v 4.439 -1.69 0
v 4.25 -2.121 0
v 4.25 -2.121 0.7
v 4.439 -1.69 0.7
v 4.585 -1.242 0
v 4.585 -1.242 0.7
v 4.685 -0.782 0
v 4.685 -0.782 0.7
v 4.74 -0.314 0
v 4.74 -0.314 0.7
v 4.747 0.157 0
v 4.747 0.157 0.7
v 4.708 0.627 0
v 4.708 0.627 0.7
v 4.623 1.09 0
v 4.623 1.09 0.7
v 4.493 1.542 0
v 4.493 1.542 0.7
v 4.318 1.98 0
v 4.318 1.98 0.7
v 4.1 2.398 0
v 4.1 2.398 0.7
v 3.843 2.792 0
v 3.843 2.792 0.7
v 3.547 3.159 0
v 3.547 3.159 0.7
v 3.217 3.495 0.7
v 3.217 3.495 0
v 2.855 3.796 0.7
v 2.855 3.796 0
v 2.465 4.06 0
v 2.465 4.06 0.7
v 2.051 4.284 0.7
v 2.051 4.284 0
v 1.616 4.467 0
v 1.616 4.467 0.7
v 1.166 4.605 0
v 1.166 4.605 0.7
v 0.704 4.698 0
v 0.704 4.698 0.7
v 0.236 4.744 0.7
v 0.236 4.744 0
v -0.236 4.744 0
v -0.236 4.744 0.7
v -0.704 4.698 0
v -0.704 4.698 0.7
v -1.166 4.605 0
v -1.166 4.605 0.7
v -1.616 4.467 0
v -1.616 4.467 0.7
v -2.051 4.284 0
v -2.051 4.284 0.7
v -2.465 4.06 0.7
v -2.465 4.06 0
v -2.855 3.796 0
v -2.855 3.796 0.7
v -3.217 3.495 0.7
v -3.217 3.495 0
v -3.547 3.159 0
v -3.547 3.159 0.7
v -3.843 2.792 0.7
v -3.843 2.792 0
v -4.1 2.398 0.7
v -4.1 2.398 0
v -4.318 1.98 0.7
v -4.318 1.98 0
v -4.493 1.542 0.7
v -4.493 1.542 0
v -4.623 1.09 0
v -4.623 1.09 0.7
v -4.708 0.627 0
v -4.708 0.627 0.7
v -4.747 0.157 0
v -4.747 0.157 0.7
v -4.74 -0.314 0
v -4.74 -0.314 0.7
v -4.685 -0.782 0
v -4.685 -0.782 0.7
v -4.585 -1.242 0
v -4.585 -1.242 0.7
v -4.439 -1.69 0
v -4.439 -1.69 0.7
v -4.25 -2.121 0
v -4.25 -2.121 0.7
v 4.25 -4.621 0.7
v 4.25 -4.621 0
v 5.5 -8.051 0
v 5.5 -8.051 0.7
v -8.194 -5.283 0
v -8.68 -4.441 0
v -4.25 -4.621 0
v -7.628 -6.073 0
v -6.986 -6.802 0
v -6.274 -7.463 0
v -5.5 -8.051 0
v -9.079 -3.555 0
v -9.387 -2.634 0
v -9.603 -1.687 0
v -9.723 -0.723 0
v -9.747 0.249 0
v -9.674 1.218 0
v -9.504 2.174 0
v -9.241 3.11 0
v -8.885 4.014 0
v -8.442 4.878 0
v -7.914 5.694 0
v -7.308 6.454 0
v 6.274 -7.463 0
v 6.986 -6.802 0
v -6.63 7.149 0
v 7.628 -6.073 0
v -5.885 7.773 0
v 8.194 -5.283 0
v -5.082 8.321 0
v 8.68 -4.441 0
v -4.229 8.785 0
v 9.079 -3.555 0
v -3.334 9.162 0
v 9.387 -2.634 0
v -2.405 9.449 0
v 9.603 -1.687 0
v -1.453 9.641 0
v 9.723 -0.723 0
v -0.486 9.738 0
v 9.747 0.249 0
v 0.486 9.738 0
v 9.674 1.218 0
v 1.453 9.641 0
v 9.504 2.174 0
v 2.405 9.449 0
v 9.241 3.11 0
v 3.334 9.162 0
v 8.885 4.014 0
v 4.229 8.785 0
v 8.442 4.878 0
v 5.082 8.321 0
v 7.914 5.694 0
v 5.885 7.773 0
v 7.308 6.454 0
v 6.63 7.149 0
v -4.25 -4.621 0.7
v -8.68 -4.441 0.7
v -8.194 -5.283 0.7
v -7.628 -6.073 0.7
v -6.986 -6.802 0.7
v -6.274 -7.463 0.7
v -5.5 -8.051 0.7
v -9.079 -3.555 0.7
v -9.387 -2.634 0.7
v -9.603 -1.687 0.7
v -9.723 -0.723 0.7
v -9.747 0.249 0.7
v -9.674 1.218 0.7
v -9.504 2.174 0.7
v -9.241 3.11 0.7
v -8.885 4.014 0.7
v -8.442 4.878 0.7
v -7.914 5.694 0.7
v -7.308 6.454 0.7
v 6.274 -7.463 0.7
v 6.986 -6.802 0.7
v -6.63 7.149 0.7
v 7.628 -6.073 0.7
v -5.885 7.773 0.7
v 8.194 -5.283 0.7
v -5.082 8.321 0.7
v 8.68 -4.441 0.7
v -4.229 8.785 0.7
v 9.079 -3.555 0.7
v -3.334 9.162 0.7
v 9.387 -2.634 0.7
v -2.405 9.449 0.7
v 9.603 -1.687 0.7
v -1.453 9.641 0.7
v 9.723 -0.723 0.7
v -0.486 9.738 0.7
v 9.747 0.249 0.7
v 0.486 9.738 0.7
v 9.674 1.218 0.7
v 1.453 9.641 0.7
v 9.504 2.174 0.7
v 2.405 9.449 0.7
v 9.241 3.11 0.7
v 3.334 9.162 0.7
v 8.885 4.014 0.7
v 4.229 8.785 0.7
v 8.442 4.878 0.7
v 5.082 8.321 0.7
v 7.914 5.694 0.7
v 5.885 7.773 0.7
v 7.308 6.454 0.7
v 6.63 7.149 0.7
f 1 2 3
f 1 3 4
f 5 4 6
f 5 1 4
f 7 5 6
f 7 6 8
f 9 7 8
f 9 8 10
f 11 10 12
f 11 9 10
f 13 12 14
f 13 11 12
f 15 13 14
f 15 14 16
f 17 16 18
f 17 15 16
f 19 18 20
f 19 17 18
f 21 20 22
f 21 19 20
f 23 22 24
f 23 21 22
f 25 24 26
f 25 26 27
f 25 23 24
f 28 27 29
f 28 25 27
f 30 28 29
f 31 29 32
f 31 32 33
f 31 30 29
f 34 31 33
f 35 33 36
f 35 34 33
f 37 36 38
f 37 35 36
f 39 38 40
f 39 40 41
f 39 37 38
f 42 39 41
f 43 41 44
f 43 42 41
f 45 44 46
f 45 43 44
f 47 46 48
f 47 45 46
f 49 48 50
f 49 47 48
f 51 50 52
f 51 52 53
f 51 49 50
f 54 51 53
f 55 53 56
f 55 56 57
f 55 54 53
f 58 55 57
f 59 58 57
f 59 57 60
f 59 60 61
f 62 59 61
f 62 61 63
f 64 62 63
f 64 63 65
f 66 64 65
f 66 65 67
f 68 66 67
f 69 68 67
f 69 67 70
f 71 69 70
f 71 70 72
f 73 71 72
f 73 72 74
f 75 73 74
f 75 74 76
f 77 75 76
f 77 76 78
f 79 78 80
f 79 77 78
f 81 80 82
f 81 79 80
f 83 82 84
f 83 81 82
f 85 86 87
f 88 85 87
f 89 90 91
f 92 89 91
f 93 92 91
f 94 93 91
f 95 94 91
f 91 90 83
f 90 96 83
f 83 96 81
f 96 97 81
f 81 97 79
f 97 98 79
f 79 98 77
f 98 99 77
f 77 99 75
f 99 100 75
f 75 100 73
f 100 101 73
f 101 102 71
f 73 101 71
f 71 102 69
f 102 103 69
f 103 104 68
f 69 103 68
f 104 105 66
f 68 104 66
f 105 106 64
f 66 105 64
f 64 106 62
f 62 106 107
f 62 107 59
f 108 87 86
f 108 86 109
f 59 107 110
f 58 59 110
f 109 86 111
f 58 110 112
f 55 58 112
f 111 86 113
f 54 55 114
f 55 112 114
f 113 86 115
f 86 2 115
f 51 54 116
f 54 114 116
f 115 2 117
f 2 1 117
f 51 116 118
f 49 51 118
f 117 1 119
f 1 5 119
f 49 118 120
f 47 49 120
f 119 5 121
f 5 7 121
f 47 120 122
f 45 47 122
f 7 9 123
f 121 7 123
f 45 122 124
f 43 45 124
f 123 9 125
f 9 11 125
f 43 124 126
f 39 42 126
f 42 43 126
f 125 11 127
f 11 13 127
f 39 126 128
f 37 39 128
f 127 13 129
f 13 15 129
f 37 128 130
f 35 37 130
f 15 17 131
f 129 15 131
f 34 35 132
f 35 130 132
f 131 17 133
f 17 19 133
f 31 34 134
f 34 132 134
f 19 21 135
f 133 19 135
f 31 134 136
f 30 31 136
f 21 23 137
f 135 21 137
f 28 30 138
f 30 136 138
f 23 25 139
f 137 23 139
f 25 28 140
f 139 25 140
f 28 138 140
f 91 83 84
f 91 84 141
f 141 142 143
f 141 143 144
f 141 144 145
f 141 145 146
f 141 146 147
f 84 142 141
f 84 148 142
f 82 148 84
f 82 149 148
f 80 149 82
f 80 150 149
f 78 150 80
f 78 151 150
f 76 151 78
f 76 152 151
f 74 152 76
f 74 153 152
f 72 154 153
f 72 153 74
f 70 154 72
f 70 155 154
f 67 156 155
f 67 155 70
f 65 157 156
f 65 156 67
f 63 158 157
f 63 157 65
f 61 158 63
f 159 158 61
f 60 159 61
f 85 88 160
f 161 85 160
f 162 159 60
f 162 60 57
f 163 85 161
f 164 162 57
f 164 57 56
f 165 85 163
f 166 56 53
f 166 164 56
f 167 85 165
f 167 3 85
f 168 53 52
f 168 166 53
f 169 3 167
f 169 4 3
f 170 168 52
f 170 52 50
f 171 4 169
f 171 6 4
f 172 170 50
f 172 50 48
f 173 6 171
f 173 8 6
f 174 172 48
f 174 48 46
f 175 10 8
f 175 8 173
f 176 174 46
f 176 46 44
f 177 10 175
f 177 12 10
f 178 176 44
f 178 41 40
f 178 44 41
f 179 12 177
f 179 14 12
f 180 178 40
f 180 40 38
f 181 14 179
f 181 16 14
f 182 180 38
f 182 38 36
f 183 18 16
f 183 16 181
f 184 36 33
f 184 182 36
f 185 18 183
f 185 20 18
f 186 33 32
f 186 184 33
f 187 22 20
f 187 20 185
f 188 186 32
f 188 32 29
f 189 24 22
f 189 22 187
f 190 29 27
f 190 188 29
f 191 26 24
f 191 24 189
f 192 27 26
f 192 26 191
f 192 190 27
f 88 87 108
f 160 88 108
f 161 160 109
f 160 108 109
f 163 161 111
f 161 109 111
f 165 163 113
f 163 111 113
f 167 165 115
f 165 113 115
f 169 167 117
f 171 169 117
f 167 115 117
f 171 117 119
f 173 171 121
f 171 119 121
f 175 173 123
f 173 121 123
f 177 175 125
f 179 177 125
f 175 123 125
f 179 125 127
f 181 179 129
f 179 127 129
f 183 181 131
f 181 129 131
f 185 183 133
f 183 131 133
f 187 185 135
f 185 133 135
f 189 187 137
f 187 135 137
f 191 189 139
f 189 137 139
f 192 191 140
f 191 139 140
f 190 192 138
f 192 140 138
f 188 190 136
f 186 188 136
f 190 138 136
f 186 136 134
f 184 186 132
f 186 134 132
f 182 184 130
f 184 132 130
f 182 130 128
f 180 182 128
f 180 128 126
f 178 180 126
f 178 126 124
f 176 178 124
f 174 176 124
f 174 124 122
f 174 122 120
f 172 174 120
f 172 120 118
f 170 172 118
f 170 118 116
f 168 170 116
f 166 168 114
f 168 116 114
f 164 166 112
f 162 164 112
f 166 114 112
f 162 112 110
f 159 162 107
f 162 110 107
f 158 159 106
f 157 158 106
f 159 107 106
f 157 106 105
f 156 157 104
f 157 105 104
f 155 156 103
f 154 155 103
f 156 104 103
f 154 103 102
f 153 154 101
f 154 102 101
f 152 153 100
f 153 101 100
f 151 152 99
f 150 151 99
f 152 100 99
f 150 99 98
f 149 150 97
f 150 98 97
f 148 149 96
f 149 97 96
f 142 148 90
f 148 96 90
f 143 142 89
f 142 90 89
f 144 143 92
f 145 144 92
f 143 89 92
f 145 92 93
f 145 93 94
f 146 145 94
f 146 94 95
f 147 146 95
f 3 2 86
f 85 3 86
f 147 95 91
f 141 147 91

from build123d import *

# Parameters (mm, degrees)
EXTRUDE_DEPTH = 0.7


with BuildPart() as part:
    # Sketch → Extrude (new body)
    with BuildSketch(Plane.XY):
        with BuildLine():
            ThreePointArc((5.5, -8.050621), (0, 9.75), (-5.5, -8.050621))
            Line((-5.5, -8.050621), (-4.25, -4.62132))
            Line((-4.25, -2.12132), (-4.25, -4.62132))
            ThreePointArc((4.25, -2.12132), (0, 4.75), (-4.25, -2.12132))
            Line((4.25, -2.12132), (4.25, -4.62132))
            Line((4.25, -4.62132), (5.5, -8.050621))
        make_face()
    extrude(amount=EXTRUDE_DEPTH)


solid = part.part
